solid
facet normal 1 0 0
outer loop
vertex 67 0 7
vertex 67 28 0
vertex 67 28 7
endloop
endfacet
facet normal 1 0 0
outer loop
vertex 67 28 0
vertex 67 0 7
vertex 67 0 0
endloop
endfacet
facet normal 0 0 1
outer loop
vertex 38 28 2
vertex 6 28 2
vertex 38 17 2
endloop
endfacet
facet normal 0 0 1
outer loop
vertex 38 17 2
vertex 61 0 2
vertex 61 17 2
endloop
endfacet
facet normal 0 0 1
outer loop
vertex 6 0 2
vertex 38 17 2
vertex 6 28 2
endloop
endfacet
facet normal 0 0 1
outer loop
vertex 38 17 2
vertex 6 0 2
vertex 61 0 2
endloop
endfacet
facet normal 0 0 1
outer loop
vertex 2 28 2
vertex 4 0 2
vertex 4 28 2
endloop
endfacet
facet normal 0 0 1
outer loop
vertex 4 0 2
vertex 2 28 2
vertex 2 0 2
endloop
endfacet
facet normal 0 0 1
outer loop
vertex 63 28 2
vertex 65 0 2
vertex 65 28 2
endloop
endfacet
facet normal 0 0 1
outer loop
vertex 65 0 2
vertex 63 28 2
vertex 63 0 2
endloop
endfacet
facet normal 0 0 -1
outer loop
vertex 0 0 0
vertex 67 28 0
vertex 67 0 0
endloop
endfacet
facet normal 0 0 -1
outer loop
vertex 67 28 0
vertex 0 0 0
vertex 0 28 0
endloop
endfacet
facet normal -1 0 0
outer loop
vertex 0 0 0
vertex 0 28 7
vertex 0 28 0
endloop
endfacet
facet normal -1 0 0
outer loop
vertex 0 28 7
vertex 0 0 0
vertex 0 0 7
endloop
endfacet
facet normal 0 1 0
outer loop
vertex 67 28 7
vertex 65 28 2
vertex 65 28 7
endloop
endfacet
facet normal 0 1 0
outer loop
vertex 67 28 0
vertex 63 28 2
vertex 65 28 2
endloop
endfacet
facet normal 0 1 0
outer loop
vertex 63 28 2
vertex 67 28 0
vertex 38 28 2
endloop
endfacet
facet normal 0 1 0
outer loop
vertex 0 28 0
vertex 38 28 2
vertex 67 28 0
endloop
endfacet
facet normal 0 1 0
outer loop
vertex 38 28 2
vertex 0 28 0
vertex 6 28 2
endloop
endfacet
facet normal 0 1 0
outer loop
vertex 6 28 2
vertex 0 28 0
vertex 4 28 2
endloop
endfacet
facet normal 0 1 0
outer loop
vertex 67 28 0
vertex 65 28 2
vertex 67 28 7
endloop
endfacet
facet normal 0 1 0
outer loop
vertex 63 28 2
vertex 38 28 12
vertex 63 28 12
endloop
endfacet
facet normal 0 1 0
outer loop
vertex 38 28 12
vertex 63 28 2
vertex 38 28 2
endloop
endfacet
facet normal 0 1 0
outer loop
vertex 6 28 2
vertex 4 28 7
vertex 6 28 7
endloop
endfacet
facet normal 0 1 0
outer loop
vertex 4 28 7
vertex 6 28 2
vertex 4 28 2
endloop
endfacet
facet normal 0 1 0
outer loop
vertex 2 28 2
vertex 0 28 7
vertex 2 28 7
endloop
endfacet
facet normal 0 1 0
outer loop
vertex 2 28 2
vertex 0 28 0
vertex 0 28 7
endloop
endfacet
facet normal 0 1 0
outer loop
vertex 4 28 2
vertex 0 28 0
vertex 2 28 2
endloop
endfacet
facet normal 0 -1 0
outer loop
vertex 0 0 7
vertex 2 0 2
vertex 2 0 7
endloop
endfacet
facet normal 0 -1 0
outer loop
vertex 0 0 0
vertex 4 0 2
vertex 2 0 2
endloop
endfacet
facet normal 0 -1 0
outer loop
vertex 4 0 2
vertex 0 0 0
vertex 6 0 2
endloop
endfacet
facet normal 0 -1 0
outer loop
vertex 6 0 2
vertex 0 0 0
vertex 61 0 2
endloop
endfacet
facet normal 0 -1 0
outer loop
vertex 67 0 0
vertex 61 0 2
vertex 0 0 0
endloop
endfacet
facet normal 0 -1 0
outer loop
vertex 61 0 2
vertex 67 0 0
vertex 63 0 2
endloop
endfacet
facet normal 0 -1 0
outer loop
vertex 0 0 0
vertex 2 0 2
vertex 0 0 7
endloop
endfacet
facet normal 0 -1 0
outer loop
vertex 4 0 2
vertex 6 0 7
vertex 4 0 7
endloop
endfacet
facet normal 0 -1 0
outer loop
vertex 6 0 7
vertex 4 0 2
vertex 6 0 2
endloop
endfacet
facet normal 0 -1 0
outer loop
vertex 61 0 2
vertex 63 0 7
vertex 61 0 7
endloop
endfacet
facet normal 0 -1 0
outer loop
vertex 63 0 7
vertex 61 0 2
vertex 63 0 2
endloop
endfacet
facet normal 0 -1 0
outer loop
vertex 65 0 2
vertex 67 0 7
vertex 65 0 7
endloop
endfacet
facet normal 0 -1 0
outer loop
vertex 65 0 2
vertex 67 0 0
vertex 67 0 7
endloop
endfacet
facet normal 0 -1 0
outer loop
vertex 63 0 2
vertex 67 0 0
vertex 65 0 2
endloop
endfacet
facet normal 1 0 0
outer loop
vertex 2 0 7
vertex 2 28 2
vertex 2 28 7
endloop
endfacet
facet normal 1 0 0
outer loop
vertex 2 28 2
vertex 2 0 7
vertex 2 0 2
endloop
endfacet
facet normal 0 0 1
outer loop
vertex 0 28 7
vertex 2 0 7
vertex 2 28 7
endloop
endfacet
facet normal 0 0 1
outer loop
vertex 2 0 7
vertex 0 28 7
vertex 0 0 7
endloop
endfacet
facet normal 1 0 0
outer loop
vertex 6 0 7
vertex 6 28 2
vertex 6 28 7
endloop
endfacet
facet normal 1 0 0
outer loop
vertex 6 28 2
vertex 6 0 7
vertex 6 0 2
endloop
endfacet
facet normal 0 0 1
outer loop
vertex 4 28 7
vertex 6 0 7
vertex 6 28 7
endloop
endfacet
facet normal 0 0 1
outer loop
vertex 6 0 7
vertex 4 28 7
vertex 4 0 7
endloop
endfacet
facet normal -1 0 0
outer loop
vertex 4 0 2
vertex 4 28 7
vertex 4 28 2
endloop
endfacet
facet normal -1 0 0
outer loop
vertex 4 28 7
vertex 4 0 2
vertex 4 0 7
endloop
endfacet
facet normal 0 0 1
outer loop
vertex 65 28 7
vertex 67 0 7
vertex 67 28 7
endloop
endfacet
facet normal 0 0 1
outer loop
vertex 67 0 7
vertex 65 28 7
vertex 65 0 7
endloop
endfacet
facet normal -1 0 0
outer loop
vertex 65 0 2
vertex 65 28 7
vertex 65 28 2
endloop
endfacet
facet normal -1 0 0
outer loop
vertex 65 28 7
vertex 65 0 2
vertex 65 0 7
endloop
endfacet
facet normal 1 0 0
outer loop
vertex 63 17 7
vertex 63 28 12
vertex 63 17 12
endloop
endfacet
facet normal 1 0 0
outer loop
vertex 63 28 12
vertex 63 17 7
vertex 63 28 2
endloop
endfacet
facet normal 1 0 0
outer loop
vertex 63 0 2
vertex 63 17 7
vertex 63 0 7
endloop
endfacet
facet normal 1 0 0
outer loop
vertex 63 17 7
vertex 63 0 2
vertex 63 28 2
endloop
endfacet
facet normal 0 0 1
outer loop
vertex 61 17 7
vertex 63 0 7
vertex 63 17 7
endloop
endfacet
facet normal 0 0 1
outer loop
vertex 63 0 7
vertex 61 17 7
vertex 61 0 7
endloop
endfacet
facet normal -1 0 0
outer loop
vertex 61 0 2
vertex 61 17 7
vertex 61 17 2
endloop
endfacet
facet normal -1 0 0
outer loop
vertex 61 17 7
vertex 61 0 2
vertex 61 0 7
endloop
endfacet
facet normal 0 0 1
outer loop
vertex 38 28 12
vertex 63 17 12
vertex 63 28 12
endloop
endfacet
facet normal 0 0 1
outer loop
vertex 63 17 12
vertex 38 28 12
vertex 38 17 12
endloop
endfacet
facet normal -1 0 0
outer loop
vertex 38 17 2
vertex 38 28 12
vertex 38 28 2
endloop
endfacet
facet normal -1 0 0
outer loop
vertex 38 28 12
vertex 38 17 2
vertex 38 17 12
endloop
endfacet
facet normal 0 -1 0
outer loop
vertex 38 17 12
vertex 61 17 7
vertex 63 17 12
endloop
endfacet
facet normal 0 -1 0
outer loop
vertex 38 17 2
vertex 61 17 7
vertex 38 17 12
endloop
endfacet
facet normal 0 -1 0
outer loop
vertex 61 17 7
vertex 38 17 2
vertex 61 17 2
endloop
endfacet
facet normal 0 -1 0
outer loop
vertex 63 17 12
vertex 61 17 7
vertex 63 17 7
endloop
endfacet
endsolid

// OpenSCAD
thickness=2;
box_length=90;
box_width=59 + (thickness * 2 * 2);

// #translate([thickness*2, -2, 0]) cube([59, 1, 1]);

cube([box_width, 28, thickness]);
translate([0, 0, 1]) cube([thickness, 30-thickness, thickness*3]);
translate([thickness*2, 0, 1]) cube([thickness, 30-thickness, thickness*3]);

translate([box_width-thickness, 0, 1]) cube([thickness, 28, thickness*3]);
translate([box_width-(thickness*3), 0, 1]) cube([thickness, 28, thickness*3]);

translate([box_width - (thickness * 3) - 23, 17, thickness]) cube([23+thickness, 11, 10]);
